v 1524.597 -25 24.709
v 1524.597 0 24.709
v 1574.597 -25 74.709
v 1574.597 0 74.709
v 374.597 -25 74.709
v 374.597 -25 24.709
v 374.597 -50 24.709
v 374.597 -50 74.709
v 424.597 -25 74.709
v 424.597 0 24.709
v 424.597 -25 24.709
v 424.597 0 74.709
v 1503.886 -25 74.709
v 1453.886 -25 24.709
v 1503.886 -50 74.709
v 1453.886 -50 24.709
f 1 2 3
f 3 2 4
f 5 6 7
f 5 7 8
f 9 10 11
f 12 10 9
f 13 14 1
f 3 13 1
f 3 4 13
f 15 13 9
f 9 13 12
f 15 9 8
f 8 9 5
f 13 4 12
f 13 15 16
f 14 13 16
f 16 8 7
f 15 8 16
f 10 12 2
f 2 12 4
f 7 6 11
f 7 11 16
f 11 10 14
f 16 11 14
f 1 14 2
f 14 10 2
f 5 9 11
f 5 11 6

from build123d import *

# Parameters (mm, degrees)
F0_W     = 1150
F0_H     = 50
F1_DEPTH = 50
F3_DEPTH = 25
F4_W     = 50
F4_H     = 50
F5_DEPTH = 25
F6_DEPTH = 25


with BuildPart() as f1:
    # F0 (on Front) → F1 (new body)
    with BuildSketch(Plane.XZ):
        with Locations((949.597177, 49.70942)):
            Rectangle(F0_W, F0_H)
        Polygon((1524.597177, 74.70942), (1524.597177, 24.70942), (1574.597177, 74.70942), align=None)
    extrude(amount=F1_DEPTH)

    # F2 (on face) → F3 (cut)
    with BuildSketch(Plane.XZ.offset(50)):
        Polygon((1524.597177, 24.70942), (1574.597177, 74.70942), (1503.886499, 74.70942), (1453.886499, 24.70942), align=None)
    extrude(amount=-F3_DEPTH, mode=Mode.SUBTRACT)

    # F4 (on face) → F5 (cut)
    with BuildSketch(Plane(origin=(0, 0, 0), x_dir=(-1, 0, 0), z_dir=(0, 1, 0))):
        with Locations((-399.597177, 49.70942)):
            Rectangle(F4_W, F4_H)
    extrude(amount=-F5_DEPTH, mode=Mode.SUBTRACT)

    # F2 (on face) → F6 (cut)
    with BuildSketch(Plane.XZ.offset(50)):
        Polygon((1524.597177, 24.70942), (1574.597177, 74.70942), (1503.886499, 74.70942), (1453.886499, 24.70942), align=None)
    extrude(amount=-F6_DEPTH, mode=Mode.SUBTRACT)


solid = f1.part
